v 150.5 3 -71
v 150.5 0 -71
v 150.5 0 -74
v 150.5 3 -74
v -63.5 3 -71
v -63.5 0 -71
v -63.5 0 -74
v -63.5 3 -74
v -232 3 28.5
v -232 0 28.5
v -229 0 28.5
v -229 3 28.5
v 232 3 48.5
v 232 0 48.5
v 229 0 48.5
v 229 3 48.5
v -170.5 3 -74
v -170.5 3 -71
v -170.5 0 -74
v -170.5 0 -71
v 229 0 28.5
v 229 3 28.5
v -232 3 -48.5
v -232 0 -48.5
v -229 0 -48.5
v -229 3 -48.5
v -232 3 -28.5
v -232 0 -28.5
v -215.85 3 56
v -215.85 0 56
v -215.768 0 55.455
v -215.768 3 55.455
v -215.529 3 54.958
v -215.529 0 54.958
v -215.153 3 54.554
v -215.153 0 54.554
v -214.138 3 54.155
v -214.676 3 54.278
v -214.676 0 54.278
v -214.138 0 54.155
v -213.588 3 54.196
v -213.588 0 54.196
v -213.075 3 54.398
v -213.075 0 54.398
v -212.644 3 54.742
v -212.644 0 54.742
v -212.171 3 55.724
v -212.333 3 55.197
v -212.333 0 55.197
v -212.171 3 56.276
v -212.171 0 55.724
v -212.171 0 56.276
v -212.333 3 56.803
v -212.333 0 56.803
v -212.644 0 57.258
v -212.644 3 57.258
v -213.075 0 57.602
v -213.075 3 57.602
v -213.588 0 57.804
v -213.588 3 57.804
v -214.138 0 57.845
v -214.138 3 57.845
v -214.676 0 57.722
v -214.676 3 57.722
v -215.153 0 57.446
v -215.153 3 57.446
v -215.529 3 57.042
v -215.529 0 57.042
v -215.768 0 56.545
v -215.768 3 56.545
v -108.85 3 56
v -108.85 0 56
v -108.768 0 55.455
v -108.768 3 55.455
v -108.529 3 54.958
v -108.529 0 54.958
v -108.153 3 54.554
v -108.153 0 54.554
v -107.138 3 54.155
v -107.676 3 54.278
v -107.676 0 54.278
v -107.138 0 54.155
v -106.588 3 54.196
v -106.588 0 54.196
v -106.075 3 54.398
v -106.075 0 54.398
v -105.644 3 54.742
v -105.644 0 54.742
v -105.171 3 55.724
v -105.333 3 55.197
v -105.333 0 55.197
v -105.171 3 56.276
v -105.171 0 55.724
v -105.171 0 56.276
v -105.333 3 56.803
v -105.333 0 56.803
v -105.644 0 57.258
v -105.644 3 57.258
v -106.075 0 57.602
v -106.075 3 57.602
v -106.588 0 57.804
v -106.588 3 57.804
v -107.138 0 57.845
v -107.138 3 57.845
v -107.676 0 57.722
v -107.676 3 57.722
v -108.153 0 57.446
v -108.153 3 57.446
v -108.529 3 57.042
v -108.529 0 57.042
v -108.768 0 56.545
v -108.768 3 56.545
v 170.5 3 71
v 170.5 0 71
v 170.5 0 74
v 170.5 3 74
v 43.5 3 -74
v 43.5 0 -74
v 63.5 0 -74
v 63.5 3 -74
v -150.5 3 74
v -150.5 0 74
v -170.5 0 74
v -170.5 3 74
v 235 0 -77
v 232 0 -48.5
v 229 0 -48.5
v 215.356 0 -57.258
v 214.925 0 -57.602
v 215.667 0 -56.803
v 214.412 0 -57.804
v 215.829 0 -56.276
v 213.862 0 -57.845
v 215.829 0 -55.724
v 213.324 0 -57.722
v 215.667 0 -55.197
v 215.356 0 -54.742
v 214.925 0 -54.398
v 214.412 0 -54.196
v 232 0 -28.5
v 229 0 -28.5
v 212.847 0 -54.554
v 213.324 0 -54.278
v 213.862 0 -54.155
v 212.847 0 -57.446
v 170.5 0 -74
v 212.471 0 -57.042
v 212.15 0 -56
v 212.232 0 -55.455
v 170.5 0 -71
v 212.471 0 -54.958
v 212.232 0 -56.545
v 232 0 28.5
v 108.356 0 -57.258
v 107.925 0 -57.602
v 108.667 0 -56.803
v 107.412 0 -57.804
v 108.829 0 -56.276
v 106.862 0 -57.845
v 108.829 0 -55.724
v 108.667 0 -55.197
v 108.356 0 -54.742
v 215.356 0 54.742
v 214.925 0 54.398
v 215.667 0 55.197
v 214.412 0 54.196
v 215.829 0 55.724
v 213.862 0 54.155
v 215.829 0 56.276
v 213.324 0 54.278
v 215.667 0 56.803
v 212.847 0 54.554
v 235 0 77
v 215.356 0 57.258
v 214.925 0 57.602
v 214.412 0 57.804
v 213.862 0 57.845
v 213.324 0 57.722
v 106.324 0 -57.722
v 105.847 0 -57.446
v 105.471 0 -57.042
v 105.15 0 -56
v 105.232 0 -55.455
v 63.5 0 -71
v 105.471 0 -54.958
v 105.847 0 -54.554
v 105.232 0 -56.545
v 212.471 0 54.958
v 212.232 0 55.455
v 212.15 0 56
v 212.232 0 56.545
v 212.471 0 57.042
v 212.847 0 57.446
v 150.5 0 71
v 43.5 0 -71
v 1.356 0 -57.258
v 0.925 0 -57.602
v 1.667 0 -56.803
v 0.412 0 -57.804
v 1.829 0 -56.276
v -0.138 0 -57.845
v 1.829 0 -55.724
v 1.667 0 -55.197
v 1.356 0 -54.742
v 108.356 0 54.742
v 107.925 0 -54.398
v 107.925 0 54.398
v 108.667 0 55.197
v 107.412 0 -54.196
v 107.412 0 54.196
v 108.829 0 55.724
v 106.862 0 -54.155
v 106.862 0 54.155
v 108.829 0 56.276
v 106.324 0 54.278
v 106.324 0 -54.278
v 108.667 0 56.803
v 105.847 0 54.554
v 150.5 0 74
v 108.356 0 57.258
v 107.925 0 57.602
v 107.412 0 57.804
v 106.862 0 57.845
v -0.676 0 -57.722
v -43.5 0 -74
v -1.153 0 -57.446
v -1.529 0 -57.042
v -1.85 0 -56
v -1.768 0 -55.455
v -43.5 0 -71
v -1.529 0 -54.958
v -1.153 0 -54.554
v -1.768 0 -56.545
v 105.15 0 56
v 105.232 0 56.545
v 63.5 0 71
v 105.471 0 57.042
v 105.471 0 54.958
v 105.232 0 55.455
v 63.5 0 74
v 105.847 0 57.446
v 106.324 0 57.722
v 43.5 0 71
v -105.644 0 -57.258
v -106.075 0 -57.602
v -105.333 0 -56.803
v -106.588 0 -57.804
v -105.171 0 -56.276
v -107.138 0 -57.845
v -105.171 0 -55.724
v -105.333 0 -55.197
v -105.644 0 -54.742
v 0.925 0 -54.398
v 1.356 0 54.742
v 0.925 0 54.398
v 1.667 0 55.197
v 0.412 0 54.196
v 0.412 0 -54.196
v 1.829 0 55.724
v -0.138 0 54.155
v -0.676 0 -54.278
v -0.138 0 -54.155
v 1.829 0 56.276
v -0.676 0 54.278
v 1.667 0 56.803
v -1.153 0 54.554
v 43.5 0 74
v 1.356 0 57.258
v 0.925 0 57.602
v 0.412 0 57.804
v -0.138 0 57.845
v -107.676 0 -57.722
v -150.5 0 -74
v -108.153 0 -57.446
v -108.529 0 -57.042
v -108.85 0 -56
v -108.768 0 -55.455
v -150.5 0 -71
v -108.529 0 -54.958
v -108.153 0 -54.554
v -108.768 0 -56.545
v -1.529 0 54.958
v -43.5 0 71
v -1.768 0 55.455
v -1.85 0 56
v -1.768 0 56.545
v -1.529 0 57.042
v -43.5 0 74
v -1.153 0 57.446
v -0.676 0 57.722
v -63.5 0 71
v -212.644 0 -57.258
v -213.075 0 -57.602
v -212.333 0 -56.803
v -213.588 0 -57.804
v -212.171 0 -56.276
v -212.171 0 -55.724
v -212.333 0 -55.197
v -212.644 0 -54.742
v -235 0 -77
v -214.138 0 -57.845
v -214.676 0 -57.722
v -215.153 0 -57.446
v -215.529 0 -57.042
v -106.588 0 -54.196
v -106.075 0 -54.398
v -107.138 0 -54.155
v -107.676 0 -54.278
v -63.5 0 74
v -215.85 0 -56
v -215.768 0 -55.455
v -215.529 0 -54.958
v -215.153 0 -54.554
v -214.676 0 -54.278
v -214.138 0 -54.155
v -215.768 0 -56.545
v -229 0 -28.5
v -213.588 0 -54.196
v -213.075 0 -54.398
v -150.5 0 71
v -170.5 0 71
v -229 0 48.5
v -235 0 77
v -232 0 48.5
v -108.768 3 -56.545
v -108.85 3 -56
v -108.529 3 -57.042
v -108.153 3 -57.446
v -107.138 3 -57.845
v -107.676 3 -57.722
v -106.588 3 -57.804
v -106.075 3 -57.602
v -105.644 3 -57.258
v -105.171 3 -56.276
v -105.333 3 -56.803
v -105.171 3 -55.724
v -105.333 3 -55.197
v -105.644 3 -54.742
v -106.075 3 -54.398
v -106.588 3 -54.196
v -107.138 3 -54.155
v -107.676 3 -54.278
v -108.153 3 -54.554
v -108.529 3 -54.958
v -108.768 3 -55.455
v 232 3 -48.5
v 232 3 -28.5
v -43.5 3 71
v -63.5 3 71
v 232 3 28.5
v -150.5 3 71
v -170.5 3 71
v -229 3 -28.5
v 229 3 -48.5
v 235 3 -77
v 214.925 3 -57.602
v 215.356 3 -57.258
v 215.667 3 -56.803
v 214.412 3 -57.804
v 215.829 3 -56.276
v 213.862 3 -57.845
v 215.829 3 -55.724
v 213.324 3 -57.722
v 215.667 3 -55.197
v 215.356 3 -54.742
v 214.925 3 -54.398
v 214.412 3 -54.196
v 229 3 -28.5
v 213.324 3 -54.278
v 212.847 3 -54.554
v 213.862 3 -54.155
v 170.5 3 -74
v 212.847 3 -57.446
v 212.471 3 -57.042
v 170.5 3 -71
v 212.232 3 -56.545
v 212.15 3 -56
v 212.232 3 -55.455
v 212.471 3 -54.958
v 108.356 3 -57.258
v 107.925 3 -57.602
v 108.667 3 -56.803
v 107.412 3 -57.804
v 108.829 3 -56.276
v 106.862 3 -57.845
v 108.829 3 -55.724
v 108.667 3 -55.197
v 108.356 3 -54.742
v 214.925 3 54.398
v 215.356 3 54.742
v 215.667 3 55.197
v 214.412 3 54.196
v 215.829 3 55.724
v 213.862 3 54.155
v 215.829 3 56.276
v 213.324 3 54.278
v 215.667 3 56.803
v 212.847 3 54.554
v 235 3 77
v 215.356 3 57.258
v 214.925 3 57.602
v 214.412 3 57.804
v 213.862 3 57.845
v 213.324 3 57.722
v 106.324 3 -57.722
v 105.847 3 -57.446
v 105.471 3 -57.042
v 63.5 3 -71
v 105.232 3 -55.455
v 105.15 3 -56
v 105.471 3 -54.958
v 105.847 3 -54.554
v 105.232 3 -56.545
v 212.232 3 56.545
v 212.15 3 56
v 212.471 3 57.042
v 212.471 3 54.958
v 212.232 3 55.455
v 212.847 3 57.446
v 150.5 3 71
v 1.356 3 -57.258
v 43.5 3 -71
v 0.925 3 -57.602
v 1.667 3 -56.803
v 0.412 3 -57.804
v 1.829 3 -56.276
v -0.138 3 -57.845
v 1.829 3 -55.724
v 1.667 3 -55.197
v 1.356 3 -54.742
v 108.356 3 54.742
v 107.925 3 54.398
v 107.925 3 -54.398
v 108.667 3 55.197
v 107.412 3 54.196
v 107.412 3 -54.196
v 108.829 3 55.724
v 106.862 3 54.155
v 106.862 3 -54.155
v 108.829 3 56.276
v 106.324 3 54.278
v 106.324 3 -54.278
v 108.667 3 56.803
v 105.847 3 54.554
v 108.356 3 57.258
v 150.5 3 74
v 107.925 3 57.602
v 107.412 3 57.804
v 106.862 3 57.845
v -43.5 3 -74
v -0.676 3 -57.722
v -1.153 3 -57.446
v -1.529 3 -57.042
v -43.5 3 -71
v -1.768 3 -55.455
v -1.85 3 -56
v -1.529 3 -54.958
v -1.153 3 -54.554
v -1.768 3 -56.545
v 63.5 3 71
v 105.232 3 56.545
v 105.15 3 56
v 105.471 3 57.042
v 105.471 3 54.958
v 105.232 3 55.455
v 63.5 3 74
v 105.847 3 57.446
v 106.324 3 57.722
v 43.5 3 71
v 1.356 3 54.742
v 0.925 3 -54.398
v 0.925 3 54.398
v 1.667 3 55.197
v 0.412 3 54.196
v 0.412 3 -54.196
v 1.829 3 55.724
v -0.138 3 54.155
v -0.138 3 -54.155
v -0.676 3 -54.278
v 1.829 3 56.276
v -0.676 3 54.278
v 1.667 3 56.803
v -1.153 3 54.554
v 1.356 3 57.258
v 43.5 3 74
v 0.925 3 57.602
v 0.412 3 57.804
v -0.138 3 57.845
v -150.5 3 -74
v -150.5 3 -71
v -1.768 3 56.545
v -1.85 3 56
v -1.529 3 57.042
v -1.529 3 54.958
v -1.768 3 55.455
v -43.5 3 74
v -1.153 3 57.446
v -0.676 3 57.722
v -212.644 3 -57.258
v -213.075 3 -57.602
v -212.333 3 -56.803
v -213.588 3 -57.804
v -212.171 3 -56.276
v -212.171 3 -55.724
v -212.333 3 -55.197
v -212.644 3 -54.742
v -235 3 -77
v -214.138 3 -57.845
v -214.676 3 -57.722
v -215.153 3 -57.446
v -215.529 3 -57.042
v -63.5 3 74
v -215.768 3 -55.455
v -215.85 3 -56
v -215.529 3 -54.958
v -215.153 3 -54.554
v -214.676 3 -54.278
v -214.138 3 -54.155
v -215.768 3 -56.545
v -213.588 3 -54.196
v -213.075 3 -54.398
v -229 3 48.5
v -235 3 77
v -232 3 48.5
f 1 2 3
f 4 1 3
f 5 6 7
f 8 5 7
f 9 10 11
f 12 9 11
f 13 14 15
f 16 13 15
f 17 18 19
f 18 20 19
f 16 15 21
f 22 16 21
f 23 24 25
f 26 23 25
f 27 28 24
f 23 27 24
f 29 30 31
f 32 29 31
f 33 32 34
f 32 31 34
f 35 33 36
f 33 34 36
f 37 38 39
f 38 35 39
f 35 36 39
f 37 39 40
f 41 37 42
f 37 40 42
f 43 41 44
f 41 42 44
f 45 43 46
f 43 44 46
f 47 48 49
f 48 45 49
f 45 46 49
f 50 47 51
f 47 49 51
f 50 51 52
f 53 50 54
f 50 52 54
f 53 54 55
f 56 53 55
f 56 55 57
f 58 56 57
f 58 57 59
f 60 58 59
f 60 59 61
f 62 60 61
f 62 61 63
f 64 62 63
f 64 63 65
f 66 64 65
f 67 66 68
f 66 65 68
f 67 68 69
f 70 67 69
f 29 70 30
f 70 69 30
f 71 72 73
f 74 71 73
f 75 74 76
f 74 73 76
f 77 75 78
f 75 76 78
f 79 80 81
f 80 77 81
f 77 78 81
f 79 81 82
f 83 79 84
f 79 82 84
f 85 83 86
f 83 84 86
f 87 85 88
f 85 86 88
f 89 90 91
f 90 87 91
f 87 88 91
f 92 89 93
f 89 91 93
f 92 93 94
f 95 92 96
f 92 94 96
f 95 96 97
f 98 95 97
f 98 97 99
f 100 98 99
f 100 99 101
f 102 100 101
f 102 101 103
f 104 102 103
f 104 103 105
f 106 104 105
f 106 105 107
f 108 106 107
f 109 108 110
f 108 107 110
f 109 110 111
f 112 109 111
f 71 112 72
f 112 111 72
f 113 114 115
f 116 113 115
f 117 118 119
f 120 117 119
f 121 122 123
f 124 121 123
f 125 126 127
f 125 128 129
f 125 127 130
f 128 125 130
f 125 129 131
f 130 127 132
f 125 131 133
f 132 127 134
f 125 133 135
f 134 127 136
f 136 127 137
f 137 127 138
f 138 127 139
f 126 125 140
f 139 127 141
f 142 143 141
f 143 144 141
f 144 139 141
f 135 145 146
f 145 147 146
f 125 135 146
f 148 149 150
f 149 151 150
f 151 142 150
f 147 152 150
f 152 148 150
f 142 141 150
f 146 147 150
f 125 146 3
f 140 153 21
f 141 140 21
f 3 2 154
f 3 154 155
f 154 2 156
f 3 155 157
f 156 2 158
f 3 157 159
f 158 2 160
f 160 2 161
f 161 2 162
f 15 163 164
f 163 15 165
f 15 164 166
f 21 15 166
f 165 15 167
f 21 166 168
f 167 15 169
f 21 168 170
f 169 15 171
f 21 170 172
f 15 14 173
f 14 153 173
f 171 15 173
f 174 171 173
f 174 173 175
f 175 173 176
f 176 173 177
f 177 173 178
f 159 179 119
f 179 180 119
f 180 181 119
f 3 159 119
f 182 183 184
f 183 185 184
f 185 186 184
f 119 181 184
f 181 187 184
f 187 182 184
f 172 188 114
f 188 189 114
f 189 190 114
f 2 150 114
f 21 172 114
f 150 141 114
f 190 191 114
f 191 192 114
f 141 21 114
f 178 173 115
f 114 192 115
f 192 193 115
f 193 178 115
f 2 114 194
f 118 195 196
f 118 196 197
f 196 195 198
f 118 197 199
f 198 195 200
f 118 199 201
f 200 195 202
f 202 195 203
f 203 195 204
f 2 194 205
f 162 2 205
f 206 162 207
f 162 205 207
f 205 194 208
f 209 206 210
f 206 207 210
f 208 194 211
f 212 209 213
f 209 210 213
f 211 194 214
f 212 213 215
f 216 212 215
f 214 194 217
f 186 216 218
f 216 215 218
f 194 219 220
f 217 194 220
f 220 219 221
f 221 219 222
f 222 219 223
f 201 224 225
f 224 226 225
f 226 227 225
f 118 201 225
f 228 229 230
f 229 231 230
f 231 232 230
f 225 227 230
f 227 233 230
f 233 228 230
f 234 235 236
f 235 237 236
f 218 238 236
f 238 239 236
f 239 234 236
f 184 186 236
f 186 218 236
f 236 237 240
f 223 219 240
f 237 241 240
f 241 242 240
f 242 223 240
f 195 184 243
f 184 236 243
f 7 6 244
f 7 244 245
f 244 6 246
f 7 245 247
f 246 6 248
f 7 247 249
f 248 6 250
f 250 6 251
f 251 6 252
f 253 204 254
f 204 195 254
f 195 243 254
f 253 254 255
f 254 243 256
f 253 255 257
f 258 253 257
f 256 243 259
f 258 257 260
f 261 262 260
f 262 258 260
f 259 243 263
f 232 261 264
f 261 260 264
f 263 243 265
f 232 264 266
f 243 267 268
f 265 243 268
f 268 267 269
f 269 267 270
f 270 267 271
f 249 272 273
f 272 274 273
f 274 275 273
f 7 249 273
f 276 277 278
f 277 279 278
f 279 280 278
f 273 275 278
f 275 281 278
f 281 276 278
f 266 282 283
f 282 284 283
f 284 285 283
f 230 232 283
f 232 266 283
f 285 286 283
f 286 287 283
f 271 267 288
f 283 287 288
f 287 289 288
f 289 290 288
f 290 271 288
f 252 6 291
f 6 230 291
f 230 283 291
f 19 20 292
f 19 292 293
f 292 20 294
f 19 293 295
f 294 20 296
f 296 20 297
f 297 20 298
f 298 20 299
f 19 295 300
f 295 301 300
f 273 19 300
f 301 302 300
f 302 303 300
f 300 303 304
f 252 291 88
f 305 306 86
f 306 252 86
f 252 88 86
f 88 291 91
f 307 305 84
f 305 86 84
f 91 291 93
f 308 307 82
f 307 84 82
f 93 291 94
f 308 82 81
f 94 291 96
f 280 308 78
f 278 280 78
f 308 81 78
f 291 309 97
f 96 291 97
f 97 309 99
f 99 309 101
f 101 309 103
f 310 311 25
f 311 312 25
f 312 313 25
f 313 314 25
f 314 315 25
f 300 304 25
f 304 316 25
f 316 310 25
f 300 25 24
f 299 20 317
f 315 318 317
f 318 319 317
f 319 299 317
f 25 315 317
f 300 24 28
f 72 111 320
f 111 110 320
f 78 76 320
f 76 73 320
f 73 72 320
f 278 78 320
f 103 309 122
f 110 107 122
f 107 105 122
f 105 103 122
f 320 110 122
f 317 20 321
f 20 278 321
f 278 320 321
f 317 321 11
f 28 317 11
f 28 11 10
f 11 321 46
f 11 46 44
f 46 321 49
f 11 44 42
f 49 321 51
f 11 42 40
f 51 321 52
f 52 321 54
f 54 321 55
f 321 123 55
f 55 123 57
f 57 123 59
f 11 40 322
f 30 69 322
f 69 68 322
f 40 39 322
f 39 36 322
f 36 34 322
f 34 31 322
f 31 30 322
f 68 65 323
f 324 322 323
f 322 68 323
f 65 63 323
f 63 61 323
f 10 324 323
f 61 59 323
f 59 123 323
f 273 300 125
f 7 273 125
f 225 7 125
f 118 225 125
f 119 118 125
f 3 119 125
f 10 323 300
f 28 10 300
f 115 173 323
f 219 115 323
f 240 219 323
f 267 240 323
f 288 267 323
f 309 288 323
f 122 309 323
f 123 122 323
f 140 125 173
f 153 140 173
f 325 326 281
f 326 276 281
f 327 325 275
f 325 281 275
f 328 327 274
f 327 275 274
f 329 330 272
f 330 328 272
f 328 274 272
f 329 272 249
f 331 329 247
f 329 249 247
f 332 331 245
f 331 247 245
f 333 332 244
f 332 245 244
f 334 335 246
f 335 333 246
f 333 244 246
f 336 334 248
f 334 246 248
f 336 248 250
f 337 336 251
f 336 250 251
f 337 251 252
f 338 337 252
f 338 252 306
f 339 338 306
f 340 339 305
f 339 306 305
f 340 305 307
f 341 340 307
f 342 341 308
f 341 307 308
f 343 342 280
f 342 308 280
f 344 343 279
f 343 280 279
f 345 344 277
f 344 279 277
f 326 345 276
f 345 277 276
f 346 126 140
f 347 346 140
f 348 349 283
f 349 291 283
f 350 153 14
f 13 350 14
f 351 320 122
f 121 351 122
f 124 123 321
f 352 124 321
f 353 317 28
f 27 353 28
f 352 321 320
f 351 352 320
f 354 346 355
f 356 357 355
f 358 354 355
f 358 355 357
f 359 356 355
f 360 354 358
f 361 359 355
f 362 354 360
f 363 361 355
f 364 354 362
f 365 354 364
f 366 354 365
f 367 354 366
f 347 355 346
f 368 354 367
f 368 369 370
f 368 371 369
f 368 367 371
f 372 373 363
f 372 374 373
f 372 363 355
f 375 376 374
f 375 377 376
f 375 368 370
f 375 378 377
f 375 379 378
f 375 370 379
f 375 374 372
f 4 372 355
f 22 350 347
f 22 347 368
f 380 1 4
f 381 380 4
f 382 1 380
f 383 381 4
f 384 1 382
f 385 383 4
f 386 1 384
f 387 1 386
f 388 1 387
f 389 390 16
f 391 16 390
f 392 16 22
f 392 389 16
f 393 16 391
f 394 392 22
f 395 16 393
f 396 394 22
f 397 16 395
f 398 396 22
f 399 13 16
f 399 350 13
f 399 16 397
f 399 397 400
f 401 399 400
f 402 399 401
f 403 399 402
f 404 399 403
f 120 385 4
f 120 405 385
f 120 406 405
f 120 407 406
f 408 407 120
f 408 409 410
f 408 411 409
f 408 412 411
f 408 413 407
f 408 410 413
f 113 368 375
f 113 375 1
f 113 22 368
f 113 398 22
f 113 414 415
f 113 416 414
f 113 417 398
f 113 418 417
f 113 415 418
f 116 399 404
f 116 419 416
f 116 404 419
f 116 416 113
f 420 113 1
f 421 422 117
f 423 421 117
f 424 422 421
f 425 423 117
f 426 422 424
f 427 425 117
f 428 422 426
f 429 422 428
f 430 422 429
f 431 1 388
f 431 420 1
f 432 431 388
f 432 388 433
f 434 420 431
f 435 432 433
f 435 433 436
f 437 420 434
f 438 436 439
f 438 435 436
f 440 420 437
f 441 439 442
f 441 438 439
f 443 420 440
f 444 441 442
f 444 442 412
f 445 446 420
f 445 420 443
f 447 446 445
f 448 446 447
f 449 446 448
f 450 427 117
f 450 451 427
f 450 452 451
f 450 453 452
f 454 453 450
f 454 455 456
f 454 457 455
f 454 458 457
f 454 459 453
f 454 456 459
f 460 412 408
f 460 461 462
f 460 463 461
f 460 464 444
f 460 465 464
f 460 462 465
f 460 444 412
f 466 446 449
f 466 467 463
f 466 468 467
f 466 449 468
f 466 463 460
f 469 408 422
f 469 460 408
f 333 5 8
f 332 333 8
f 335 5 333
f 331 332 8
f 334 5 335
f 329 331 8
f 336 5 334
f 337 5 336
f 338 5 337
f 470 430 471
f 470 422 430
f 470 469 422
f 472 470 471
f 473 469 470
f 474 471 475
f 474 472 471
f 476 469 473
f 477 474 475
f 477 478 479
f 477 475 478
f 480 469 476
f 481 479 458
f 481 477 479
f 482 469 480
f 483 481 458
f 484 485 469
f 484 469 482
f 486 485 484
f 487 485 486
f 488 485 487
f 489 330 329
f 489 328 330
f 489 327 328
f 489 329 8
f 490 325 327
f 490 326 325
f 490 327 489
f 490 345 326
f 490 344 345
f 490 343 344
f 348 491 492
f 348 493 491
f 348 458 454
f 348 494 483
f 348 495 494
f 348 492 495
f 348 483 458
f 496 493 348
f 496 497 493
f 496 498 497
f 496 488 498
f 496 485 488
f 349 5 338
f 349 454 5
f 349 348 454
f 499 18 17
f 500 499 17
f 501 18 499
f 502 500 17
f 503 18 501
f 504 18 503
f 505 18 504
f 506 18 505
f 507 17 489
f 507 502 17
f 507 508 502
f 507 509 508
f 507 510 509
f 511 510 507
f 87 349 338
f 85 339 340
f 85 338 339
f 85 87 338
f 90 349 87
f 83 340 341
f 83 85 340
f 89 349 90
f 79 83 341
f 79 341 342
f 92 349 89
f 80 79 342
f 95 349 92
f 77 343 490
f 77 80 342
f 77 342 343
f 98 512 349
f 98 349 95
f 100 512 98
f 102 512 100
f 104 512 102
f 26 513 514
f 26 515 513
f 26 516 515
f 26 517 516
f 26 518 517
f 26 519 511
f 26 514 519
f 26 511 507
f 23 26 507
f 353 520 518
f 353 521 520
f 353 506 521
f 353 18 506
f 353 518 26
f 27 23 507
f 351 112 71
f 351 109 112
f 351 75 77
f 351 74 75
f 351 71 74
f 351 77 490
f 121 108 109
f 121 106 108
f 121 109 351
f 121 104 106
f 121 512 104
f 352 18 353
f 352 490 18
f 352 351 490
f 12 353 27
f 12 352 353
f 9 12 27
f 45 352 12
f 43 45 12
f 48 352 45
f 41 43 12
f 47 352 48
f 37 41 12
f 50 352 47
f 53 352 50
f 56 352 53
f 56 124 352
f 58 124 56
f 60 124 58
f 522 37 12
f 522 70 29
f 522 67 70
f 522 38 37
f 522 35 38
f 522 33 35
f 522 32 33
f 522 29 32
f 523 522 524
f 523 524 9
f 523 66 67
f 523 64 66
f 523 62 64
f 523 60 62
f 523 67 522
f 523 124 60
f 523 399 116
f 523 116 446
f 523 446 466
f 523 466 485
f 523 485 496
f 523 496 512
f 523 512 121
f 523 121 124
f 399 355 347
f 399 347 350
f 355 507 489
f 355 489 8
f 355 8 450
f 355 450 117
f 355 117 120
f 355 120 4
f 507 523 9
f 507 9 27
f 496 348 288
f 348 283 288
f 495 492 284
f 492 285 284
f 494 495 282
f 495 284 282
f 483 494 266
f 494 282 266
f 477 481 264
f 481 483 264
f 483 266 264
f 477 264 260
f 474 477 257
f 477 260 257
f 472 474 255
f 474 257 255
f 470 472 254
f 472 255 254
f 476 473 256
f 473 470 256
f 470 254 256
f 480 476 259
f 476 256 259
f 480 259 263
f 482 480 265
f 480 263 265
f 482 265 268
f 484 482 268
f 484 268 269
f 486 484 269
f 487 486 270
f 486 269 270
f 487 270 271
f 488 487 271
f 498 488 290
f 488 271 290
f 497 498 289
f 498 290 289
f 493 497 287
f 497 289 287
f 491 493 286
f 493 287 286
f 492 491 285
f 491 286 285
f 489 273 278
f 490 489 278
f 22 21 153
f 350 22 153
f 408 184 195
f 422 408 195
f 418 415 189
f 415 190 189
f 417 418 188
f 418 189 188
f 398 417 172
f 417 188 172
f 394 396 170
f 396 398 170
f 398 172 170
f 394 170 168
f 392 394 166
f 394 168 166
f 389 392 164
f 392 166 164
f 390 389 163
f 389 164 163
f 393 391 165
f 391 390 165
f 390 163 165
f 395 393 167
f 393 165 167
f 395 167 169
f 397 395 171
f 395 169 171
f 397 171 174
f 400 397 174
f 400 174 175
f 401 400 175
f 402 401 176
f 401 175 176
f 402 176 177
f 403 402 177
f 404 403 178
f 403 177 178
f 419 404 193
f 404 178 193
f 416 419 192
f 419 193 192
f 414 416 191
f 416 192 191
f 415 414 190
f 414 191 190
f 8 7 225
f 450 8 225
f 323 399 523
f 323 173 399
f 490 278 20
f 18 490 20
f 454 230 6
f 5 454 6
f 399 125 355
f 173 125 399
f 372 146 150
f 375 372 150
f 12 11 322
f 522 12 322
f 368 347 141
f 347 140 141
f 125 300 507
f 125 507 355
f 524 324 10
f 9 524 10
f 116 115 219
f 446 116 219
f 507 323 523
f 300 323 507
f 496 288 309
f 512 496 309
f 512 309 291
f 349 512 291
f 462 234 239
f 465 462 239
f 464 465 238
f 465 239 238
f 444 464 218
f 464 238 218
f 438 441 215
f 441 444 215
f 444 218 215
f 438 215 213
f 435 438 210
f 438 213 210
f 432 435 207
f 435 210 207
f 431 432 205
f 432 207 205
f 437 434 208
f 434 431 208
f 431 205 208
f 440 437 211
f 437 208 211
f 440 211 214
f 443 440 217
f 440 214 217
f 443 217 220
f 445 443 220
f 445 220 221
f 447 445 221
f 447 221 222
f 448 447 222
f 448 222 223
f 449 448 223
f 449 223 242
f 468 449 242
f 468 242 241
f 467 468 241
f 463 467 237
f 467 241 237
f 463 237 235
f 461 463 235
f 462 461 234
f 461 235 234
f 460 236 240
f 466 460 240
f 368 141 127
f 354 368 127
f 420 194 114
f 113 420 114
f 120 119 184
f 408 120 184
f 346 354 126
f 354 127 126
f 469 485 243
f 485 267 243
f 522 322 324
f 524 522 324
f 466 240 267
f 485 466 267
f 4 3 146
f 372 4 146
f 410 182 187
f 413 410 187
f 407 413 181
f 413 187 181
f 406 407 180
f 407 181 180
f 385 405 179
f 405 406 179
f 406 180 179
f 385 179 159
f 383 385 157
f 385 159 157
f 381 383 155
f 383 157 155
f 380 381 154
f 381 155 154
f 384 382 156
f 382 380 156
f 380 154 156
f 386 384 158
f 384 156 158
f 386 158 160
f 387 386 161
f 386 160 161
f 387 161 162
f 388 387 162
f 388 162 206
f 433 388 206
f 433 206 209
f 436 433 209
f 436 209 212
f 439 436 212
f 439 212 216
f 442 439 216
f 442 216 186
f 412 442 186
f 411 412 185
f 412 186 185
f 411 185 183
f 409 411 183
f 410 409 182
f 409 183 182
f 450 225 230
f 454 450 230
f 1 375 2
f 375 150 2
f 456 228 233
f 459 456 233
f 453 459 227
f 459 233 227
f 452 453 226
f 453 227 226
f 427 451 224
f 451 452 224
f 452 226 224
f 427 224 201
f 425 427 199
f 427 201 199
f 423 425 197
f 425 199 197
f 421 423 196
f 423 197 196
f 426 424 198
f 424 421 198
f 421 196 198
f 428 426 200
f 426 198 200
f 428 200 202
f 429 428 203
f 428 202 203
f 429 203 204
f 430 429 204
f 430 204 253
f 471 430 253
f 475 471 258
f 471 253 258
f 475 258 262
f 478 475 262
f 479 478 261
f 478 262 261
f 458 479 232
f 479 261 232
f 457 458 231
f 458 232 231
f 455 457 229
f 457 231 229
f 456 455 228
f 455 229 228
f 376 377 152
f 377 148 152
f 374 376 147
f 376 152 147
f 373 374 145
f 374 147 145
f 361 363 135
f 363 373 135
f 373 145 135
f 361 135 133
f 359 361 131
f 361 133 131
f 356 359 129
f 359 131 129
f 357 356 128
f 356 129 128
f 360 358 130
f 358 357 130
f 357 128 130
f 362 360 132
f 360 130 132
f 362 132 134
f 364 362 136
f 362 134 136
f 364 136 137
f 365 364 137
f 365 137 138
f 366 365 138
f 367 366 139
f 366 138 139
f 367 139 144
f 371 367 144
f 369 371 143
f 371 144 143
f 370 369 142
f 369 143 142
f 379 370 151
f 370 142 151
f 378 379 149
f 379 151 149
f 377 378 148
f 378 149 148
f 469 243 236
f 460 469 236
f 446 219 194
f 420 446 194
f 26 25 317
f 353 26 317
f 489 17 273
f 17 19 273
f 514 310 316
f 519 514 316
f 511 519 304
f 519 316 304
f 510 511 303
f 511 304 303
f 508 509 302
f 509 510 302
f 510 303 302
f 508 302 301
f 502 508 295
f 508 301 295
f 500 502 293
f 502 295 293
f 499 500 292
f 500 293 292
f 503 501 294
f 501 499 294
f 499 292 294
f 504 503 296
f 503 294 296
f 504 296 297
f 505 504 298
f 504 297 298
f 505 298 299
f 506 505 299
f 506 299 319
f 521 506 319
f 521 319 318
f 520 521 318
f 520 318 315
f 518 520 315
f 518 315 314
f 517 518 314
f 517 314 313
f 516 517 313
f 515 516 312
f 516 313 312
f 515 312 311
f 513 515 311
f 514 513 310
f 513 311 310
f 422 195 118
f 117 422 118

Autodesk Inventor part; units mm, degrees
ref_plane "YZ Plane" through (0, 0, 0) normal (1, 0, 0) x (0, 1, 0)
ref_plane "XZ Plane" through (0, 0, 0) normal (0, 1, 0) x (-1, 0, 0)
ref_plane "XY Plane" through (0, 0, 0) normal (0, 0, 1) x (1, 0, 0)
sketch "Sketch1" plane through (0, 0, 0) normal (0, 1, 0) x (-1, 0, 0)
  line L0 (254, -152.4) -> (-254, -152.4) construction
  line L1 (-254, -152.4) -> (-254, 152.4) construction
  line L2 (-254, 152.4) -> (254, 152.4) construction
  line L3 (254, 152.4) -> (254, -152.4) construction
  line L4 (250, -150) -> (-250, -150) construction
  line L5 (-250, -150) -> (-250, 150) construction
  line L6 (-250, 150) -> (250, 150) construction
  line L7 (250, 150) -> (250, -150) construction
  line L8 (35, -51) -> (-35, -51) construction
  line L9 (-35, -51) -> (-35, 51) construction
  line L10 (-35, 51) -> (35, 51) construction
  line L11 (35, 51) -> (35, -51) construction
  line L12 (-52, -51) -> (-122, -51) construction
  line L13 (-52, 51) -> (-52, -51) construction
  line L14 (-122, 51) -> (-52, 51) construction
  line L15 (-122, -51) -> (-122, 51) construction
  line L16 (-139, -51) -> (-209, -51) construction
  line L17 (-139, 51) -> (-139, -51) construction
  line L18 (-209, 51) -> (-139, 51) construction
  line L19 (-209, -51) -> (-209, 51) construction
  line L20 (122, -51) -> (52, -51) construction
  line L21 (122, 51) -> (122, -51) construction
  line L22 (52, 51) -> (122, 51) construction
  line L23 (52, -51) -> (52, 51) construction
  line L24 (35, -51) -> (-35, -51) construction
  line L25 (35, 51) -> (35, -51) construction
  line L26 (-35, 51) -> (35, 51) construction
  line L27 (-35, -51) -> (-35, 51) construction
  line L28 (-52, -51) -> (-122, -51) construction
  line L29 (-52, 51) -> (-52, -51) construction
  line L30 (-122, 51) -> (-52, 51) construction
  line L31 (-122, -51) -> (-122, 51) construction
  line L32 (209, -51) -> (139, -51) construction
  line L33 (209, 51) -> (209, -51) construction
  line L34 (139, 51) -> (209, 51) construction
  line L35 (139, -51) -> (139, 51) construction
  line L36 (122, -51) -> (52, -51) construction
  line L37 (122, 51) -> (122, -51) construction
  line L38 (52, 51) -> (122, 51) construction
  line L39 (52, -51) -> (52, 51) construction
  line L40 (35, -51) -> (-35, -51) construction
  line L41 (35, 51) -> (35, -51) construction
  line L42 (-35, 51) -> (35, 51) construction
  line L43 (-35, -51) -> (-35, 51) construction
  line L44 (188.5027, 1.1241) -> (237.2968, 1.1241) construction
  line L45 (194, 27.9543) -> (222.5108, 27.9543) construction
  line L46 (235, -77) -> (-235, -77)
  line L47 (-235, -77) -> (-235, 77)
  line L48 (-235, 77) -> (235, 77)
  line L49 (235, 77) -> (235, -77)
  circle A0 centre (0, -56) radius 1.85
  circle A1 centre (107, -56) radius 1.85
  circle A2 centre (-107, -56) radius 1.85
  circle A3 centre (107, 56) radius 1.85
  circle A4 centre (-107, 56) radius 1.85
  circle A5 centre (0, 56) radius 1.85
  circle A6 centre (214, -56) radius 1.85
  circle A7 centre (214, 56) radius 1.85
  circle A8 centre (-214, 56) radius 1.85
  circle A9 centre (-214, -56) radius 1.85
  line L50 (170.5, -74) -> (150.5, -74)
  line L51 (150.5, -74) -> (150.5, -71)
  line L52 (150.5, -71) -> (170.5, -71)
  line L53 (170.5, -71) -> (170.5, -74)
  line L54 (160.5, -74) -> (160.5, -71) construction
  line L55 (170.5, 71) -> (150.5, 71)
  line L56 (150.5, 71) -> (150.5, 74)
  line L57 (150.5, 74) -> (170.5, 74)
  line L58 (170.5, 74) -> (170.5, 71)
  line L59 (160.5, 71) -> (160.5, 74) construction
  line L60 (43.5, -71) -> (63.5, -71)
  line L61 (43.5, -74) -> (43.5, -71)
  line L62 (63.5, -74) -> (43.5, -74)
  line L63 (53.5, -74) -> (53.5, -71) construction
  line L64 (63.5, -71) -> (63.5, -74)
  line L65 (63.5, 71) -> (43.5, 71)
  line L66 (43.5, 71) -> (43.5, 74)
  line L67 (43.5, 74) -> (63.5, 74)
  line L68 (53.5, 71) -> (53.5, 74) construction
  line L69 (63.5, 74) -> (63.5, 71)
  line L70 (-63.5, -71) -> (-43.5, -71)
  line L71 (-63.5, -74) -> (-63.5, -71)
  line L72 (-43.5, -74) -> (-63.5, -74)
  line L73 (-53.5, -74) -> (-53.5, -71) construction
  line L74 (-43.5, -71) -> (-43.5, -74)
  line L75 (-43.5, 71) -> (-63.5, 71)
  line L76 (-63.5, 71) -> (-63.5, 74)
  line L77 (-63.5, 74) -> (-43.5, 74)
  line L78 (-53.5, 71) -> (-53.5, 74) construction
  line L79 (-43.5, 74) -> (-43.5, 71)
  line L80 (-170.5, -71) -> (-150.5, -71)
  line L81 (-170.5, -74) -> (-170.5, -71)
  line L82 (-150.5, -74) -> (-170.5, -74)
  line L83 (-160.5, -74) -> (-160.5, -71) construction
  line L84 (-150.5, -71) -> (-150.5, -74)
  line L85 (-150.5, 71) -> (-170.5, 71)
  line L86 (-170.5, 71) -> (-170.5, 74)
  line L87 (-170.5, 74) -> (-150.5, 74)
  line L88 (-160.5, 71) -> (-160.5, 74) construction
  line L89 (-150.5, 74) -> (-150.5, 71)
  line L90 (232, -48.5) -> (229, -48.5)
  line L91 (229, -48.5) -> (229, -28.5)
  line L92 (229, -28.5) -> (232, -28.5)
  line L93 (232, -28.5) -> (232, -48.5)
  line L94 (232, -38.5) -> (229, -38.5) construction
  line L95 (232, 28.5) -> (229, 28.5)
  line L96 (229, 28.5) -> (229, 48.5)
  line L97 (229, 48.5) -> (232, 48.5)
  line L98 (232, 48.5) -> (232, 28.5)
  line L99 (232, 38.5) -> (229, 38.5) construction
  line L100 (-229, -48.5) -> (-232, -48.5)
  line L101 (-232, -48.5) -> (-232, -28.5)
  line L102 (-232, -28.5) -> (-229, -28.5)
  line L103 (-229, -28.5) -> (-229, -48.5)
  line L104 (-229, 28.5) -> (-232, 28.5)
  line L105 (-232, 28.5) -> (-232, 48.5)
  line L106 (-232, 48.5) -> (-229, 48.5)
  line L107 (-229, 48.5) -> (-229, 28.5)
  line L108 (-229, -38.5) -> (-232, -38.5) construction
  line L109 (-229, 38.5) -> (-232, 38.5) construction
  point P0 (0, 0)
  point P1 (254, 0)
  point P2 (0, -152.4)
  point P3 (0, -150)
  point P4 (-250, 0)
  point P5 (0, -80)
  point P6 (0, -51)
  point P7 (-35, 0)
  point P8 (-87, -51)
  point P9 (-87, 0)
  point P10 (-122, 0)
  point P11 (-174, -51)
  point P12 (-174, 0)
  point P13 (-209, 0)
  point P14 (87, -51)
  point P15 (87, 0)
  point P16 (52, 0)
  point P17 (0, -51)
  point P18 (0, 0)
  point P19 (-35, 0)
  point P20 (-87, -51)
  point P21 (-87, 0)
  point P22 (-122, 0)
  point P23 (174, -51)
  point P24 (174, 0)
  point P25 (139, 0)
  point P26 (87, -51)
  point P27 (87, 0)
  point P28 (52, 0)
  point P29 (0, -51)
  point P30 (0, 0)
  point P31 (-35, 0)
  point P32 (-7, -51)
  point P33 (-21, -51)
  point P34 (7, 51)
  point P35 (21, 51)
  point P36 (-122, -21)
  point P37 (-122, -36)
  point P38 (-160, 51)
  point P39 (-188, 51)
  point P40 (105, -51)
  point P41 (69, -51)
  point P42 (-235, 0)
  point P43 (0, -77)
  point P44 (139, -27.0457)
  point P45 (139, -12.0457)
  dimension "d0" = 508
  dimension "d1" = 304.8
  dimension "d2" = 500
  dimension "d3" = 300
  dimension "d6" = 70
  dimension "d10" = 87
  dimension "d13" = 87
  dimension "d63" = 470
  dimension "d67" = 154
  dimension "d68" = 418
  dimension "d71" = 3.7
  dimension "d72" = 5
  dimension "d73" = 5
  dimension "d74" = 107
  dimension "d75" = 107
  dimension "d76" = 107
  dimension "d77" = 107
  dimension "d78" = 3
  dimension "d79" = 20
  dimension "d80" = 3
  dimension "d81" = 160.5
  dimension "d82" = 20
  dimension "d83" = 3
  dimension "d84" = 3
  dimension "d87" = 107
  dimension "d92" = 3
  dimension "d93" = 20
  dimension "d94" = 38.5
  dimension "d95" = 3
  dimension "d96" = 3
  dimension "d97" = 20
  dimension "d98" = 3
  dimension "d99" = 38.5
  dimension "d100" = 3
  dimension "d101" = 20
  dimension "d102" = 3
  dimension "d103" = 20
  dimension "d104" = 3
extrude "Extrusion2" add sketch "Sketch1" along normal blind 3
equation "\"thickness\" = 3"
equation "\"kerf\" = 0.1"
equation "\"loose\" = 1.05"
properties part number "BungaSign-Bigger-Back"
